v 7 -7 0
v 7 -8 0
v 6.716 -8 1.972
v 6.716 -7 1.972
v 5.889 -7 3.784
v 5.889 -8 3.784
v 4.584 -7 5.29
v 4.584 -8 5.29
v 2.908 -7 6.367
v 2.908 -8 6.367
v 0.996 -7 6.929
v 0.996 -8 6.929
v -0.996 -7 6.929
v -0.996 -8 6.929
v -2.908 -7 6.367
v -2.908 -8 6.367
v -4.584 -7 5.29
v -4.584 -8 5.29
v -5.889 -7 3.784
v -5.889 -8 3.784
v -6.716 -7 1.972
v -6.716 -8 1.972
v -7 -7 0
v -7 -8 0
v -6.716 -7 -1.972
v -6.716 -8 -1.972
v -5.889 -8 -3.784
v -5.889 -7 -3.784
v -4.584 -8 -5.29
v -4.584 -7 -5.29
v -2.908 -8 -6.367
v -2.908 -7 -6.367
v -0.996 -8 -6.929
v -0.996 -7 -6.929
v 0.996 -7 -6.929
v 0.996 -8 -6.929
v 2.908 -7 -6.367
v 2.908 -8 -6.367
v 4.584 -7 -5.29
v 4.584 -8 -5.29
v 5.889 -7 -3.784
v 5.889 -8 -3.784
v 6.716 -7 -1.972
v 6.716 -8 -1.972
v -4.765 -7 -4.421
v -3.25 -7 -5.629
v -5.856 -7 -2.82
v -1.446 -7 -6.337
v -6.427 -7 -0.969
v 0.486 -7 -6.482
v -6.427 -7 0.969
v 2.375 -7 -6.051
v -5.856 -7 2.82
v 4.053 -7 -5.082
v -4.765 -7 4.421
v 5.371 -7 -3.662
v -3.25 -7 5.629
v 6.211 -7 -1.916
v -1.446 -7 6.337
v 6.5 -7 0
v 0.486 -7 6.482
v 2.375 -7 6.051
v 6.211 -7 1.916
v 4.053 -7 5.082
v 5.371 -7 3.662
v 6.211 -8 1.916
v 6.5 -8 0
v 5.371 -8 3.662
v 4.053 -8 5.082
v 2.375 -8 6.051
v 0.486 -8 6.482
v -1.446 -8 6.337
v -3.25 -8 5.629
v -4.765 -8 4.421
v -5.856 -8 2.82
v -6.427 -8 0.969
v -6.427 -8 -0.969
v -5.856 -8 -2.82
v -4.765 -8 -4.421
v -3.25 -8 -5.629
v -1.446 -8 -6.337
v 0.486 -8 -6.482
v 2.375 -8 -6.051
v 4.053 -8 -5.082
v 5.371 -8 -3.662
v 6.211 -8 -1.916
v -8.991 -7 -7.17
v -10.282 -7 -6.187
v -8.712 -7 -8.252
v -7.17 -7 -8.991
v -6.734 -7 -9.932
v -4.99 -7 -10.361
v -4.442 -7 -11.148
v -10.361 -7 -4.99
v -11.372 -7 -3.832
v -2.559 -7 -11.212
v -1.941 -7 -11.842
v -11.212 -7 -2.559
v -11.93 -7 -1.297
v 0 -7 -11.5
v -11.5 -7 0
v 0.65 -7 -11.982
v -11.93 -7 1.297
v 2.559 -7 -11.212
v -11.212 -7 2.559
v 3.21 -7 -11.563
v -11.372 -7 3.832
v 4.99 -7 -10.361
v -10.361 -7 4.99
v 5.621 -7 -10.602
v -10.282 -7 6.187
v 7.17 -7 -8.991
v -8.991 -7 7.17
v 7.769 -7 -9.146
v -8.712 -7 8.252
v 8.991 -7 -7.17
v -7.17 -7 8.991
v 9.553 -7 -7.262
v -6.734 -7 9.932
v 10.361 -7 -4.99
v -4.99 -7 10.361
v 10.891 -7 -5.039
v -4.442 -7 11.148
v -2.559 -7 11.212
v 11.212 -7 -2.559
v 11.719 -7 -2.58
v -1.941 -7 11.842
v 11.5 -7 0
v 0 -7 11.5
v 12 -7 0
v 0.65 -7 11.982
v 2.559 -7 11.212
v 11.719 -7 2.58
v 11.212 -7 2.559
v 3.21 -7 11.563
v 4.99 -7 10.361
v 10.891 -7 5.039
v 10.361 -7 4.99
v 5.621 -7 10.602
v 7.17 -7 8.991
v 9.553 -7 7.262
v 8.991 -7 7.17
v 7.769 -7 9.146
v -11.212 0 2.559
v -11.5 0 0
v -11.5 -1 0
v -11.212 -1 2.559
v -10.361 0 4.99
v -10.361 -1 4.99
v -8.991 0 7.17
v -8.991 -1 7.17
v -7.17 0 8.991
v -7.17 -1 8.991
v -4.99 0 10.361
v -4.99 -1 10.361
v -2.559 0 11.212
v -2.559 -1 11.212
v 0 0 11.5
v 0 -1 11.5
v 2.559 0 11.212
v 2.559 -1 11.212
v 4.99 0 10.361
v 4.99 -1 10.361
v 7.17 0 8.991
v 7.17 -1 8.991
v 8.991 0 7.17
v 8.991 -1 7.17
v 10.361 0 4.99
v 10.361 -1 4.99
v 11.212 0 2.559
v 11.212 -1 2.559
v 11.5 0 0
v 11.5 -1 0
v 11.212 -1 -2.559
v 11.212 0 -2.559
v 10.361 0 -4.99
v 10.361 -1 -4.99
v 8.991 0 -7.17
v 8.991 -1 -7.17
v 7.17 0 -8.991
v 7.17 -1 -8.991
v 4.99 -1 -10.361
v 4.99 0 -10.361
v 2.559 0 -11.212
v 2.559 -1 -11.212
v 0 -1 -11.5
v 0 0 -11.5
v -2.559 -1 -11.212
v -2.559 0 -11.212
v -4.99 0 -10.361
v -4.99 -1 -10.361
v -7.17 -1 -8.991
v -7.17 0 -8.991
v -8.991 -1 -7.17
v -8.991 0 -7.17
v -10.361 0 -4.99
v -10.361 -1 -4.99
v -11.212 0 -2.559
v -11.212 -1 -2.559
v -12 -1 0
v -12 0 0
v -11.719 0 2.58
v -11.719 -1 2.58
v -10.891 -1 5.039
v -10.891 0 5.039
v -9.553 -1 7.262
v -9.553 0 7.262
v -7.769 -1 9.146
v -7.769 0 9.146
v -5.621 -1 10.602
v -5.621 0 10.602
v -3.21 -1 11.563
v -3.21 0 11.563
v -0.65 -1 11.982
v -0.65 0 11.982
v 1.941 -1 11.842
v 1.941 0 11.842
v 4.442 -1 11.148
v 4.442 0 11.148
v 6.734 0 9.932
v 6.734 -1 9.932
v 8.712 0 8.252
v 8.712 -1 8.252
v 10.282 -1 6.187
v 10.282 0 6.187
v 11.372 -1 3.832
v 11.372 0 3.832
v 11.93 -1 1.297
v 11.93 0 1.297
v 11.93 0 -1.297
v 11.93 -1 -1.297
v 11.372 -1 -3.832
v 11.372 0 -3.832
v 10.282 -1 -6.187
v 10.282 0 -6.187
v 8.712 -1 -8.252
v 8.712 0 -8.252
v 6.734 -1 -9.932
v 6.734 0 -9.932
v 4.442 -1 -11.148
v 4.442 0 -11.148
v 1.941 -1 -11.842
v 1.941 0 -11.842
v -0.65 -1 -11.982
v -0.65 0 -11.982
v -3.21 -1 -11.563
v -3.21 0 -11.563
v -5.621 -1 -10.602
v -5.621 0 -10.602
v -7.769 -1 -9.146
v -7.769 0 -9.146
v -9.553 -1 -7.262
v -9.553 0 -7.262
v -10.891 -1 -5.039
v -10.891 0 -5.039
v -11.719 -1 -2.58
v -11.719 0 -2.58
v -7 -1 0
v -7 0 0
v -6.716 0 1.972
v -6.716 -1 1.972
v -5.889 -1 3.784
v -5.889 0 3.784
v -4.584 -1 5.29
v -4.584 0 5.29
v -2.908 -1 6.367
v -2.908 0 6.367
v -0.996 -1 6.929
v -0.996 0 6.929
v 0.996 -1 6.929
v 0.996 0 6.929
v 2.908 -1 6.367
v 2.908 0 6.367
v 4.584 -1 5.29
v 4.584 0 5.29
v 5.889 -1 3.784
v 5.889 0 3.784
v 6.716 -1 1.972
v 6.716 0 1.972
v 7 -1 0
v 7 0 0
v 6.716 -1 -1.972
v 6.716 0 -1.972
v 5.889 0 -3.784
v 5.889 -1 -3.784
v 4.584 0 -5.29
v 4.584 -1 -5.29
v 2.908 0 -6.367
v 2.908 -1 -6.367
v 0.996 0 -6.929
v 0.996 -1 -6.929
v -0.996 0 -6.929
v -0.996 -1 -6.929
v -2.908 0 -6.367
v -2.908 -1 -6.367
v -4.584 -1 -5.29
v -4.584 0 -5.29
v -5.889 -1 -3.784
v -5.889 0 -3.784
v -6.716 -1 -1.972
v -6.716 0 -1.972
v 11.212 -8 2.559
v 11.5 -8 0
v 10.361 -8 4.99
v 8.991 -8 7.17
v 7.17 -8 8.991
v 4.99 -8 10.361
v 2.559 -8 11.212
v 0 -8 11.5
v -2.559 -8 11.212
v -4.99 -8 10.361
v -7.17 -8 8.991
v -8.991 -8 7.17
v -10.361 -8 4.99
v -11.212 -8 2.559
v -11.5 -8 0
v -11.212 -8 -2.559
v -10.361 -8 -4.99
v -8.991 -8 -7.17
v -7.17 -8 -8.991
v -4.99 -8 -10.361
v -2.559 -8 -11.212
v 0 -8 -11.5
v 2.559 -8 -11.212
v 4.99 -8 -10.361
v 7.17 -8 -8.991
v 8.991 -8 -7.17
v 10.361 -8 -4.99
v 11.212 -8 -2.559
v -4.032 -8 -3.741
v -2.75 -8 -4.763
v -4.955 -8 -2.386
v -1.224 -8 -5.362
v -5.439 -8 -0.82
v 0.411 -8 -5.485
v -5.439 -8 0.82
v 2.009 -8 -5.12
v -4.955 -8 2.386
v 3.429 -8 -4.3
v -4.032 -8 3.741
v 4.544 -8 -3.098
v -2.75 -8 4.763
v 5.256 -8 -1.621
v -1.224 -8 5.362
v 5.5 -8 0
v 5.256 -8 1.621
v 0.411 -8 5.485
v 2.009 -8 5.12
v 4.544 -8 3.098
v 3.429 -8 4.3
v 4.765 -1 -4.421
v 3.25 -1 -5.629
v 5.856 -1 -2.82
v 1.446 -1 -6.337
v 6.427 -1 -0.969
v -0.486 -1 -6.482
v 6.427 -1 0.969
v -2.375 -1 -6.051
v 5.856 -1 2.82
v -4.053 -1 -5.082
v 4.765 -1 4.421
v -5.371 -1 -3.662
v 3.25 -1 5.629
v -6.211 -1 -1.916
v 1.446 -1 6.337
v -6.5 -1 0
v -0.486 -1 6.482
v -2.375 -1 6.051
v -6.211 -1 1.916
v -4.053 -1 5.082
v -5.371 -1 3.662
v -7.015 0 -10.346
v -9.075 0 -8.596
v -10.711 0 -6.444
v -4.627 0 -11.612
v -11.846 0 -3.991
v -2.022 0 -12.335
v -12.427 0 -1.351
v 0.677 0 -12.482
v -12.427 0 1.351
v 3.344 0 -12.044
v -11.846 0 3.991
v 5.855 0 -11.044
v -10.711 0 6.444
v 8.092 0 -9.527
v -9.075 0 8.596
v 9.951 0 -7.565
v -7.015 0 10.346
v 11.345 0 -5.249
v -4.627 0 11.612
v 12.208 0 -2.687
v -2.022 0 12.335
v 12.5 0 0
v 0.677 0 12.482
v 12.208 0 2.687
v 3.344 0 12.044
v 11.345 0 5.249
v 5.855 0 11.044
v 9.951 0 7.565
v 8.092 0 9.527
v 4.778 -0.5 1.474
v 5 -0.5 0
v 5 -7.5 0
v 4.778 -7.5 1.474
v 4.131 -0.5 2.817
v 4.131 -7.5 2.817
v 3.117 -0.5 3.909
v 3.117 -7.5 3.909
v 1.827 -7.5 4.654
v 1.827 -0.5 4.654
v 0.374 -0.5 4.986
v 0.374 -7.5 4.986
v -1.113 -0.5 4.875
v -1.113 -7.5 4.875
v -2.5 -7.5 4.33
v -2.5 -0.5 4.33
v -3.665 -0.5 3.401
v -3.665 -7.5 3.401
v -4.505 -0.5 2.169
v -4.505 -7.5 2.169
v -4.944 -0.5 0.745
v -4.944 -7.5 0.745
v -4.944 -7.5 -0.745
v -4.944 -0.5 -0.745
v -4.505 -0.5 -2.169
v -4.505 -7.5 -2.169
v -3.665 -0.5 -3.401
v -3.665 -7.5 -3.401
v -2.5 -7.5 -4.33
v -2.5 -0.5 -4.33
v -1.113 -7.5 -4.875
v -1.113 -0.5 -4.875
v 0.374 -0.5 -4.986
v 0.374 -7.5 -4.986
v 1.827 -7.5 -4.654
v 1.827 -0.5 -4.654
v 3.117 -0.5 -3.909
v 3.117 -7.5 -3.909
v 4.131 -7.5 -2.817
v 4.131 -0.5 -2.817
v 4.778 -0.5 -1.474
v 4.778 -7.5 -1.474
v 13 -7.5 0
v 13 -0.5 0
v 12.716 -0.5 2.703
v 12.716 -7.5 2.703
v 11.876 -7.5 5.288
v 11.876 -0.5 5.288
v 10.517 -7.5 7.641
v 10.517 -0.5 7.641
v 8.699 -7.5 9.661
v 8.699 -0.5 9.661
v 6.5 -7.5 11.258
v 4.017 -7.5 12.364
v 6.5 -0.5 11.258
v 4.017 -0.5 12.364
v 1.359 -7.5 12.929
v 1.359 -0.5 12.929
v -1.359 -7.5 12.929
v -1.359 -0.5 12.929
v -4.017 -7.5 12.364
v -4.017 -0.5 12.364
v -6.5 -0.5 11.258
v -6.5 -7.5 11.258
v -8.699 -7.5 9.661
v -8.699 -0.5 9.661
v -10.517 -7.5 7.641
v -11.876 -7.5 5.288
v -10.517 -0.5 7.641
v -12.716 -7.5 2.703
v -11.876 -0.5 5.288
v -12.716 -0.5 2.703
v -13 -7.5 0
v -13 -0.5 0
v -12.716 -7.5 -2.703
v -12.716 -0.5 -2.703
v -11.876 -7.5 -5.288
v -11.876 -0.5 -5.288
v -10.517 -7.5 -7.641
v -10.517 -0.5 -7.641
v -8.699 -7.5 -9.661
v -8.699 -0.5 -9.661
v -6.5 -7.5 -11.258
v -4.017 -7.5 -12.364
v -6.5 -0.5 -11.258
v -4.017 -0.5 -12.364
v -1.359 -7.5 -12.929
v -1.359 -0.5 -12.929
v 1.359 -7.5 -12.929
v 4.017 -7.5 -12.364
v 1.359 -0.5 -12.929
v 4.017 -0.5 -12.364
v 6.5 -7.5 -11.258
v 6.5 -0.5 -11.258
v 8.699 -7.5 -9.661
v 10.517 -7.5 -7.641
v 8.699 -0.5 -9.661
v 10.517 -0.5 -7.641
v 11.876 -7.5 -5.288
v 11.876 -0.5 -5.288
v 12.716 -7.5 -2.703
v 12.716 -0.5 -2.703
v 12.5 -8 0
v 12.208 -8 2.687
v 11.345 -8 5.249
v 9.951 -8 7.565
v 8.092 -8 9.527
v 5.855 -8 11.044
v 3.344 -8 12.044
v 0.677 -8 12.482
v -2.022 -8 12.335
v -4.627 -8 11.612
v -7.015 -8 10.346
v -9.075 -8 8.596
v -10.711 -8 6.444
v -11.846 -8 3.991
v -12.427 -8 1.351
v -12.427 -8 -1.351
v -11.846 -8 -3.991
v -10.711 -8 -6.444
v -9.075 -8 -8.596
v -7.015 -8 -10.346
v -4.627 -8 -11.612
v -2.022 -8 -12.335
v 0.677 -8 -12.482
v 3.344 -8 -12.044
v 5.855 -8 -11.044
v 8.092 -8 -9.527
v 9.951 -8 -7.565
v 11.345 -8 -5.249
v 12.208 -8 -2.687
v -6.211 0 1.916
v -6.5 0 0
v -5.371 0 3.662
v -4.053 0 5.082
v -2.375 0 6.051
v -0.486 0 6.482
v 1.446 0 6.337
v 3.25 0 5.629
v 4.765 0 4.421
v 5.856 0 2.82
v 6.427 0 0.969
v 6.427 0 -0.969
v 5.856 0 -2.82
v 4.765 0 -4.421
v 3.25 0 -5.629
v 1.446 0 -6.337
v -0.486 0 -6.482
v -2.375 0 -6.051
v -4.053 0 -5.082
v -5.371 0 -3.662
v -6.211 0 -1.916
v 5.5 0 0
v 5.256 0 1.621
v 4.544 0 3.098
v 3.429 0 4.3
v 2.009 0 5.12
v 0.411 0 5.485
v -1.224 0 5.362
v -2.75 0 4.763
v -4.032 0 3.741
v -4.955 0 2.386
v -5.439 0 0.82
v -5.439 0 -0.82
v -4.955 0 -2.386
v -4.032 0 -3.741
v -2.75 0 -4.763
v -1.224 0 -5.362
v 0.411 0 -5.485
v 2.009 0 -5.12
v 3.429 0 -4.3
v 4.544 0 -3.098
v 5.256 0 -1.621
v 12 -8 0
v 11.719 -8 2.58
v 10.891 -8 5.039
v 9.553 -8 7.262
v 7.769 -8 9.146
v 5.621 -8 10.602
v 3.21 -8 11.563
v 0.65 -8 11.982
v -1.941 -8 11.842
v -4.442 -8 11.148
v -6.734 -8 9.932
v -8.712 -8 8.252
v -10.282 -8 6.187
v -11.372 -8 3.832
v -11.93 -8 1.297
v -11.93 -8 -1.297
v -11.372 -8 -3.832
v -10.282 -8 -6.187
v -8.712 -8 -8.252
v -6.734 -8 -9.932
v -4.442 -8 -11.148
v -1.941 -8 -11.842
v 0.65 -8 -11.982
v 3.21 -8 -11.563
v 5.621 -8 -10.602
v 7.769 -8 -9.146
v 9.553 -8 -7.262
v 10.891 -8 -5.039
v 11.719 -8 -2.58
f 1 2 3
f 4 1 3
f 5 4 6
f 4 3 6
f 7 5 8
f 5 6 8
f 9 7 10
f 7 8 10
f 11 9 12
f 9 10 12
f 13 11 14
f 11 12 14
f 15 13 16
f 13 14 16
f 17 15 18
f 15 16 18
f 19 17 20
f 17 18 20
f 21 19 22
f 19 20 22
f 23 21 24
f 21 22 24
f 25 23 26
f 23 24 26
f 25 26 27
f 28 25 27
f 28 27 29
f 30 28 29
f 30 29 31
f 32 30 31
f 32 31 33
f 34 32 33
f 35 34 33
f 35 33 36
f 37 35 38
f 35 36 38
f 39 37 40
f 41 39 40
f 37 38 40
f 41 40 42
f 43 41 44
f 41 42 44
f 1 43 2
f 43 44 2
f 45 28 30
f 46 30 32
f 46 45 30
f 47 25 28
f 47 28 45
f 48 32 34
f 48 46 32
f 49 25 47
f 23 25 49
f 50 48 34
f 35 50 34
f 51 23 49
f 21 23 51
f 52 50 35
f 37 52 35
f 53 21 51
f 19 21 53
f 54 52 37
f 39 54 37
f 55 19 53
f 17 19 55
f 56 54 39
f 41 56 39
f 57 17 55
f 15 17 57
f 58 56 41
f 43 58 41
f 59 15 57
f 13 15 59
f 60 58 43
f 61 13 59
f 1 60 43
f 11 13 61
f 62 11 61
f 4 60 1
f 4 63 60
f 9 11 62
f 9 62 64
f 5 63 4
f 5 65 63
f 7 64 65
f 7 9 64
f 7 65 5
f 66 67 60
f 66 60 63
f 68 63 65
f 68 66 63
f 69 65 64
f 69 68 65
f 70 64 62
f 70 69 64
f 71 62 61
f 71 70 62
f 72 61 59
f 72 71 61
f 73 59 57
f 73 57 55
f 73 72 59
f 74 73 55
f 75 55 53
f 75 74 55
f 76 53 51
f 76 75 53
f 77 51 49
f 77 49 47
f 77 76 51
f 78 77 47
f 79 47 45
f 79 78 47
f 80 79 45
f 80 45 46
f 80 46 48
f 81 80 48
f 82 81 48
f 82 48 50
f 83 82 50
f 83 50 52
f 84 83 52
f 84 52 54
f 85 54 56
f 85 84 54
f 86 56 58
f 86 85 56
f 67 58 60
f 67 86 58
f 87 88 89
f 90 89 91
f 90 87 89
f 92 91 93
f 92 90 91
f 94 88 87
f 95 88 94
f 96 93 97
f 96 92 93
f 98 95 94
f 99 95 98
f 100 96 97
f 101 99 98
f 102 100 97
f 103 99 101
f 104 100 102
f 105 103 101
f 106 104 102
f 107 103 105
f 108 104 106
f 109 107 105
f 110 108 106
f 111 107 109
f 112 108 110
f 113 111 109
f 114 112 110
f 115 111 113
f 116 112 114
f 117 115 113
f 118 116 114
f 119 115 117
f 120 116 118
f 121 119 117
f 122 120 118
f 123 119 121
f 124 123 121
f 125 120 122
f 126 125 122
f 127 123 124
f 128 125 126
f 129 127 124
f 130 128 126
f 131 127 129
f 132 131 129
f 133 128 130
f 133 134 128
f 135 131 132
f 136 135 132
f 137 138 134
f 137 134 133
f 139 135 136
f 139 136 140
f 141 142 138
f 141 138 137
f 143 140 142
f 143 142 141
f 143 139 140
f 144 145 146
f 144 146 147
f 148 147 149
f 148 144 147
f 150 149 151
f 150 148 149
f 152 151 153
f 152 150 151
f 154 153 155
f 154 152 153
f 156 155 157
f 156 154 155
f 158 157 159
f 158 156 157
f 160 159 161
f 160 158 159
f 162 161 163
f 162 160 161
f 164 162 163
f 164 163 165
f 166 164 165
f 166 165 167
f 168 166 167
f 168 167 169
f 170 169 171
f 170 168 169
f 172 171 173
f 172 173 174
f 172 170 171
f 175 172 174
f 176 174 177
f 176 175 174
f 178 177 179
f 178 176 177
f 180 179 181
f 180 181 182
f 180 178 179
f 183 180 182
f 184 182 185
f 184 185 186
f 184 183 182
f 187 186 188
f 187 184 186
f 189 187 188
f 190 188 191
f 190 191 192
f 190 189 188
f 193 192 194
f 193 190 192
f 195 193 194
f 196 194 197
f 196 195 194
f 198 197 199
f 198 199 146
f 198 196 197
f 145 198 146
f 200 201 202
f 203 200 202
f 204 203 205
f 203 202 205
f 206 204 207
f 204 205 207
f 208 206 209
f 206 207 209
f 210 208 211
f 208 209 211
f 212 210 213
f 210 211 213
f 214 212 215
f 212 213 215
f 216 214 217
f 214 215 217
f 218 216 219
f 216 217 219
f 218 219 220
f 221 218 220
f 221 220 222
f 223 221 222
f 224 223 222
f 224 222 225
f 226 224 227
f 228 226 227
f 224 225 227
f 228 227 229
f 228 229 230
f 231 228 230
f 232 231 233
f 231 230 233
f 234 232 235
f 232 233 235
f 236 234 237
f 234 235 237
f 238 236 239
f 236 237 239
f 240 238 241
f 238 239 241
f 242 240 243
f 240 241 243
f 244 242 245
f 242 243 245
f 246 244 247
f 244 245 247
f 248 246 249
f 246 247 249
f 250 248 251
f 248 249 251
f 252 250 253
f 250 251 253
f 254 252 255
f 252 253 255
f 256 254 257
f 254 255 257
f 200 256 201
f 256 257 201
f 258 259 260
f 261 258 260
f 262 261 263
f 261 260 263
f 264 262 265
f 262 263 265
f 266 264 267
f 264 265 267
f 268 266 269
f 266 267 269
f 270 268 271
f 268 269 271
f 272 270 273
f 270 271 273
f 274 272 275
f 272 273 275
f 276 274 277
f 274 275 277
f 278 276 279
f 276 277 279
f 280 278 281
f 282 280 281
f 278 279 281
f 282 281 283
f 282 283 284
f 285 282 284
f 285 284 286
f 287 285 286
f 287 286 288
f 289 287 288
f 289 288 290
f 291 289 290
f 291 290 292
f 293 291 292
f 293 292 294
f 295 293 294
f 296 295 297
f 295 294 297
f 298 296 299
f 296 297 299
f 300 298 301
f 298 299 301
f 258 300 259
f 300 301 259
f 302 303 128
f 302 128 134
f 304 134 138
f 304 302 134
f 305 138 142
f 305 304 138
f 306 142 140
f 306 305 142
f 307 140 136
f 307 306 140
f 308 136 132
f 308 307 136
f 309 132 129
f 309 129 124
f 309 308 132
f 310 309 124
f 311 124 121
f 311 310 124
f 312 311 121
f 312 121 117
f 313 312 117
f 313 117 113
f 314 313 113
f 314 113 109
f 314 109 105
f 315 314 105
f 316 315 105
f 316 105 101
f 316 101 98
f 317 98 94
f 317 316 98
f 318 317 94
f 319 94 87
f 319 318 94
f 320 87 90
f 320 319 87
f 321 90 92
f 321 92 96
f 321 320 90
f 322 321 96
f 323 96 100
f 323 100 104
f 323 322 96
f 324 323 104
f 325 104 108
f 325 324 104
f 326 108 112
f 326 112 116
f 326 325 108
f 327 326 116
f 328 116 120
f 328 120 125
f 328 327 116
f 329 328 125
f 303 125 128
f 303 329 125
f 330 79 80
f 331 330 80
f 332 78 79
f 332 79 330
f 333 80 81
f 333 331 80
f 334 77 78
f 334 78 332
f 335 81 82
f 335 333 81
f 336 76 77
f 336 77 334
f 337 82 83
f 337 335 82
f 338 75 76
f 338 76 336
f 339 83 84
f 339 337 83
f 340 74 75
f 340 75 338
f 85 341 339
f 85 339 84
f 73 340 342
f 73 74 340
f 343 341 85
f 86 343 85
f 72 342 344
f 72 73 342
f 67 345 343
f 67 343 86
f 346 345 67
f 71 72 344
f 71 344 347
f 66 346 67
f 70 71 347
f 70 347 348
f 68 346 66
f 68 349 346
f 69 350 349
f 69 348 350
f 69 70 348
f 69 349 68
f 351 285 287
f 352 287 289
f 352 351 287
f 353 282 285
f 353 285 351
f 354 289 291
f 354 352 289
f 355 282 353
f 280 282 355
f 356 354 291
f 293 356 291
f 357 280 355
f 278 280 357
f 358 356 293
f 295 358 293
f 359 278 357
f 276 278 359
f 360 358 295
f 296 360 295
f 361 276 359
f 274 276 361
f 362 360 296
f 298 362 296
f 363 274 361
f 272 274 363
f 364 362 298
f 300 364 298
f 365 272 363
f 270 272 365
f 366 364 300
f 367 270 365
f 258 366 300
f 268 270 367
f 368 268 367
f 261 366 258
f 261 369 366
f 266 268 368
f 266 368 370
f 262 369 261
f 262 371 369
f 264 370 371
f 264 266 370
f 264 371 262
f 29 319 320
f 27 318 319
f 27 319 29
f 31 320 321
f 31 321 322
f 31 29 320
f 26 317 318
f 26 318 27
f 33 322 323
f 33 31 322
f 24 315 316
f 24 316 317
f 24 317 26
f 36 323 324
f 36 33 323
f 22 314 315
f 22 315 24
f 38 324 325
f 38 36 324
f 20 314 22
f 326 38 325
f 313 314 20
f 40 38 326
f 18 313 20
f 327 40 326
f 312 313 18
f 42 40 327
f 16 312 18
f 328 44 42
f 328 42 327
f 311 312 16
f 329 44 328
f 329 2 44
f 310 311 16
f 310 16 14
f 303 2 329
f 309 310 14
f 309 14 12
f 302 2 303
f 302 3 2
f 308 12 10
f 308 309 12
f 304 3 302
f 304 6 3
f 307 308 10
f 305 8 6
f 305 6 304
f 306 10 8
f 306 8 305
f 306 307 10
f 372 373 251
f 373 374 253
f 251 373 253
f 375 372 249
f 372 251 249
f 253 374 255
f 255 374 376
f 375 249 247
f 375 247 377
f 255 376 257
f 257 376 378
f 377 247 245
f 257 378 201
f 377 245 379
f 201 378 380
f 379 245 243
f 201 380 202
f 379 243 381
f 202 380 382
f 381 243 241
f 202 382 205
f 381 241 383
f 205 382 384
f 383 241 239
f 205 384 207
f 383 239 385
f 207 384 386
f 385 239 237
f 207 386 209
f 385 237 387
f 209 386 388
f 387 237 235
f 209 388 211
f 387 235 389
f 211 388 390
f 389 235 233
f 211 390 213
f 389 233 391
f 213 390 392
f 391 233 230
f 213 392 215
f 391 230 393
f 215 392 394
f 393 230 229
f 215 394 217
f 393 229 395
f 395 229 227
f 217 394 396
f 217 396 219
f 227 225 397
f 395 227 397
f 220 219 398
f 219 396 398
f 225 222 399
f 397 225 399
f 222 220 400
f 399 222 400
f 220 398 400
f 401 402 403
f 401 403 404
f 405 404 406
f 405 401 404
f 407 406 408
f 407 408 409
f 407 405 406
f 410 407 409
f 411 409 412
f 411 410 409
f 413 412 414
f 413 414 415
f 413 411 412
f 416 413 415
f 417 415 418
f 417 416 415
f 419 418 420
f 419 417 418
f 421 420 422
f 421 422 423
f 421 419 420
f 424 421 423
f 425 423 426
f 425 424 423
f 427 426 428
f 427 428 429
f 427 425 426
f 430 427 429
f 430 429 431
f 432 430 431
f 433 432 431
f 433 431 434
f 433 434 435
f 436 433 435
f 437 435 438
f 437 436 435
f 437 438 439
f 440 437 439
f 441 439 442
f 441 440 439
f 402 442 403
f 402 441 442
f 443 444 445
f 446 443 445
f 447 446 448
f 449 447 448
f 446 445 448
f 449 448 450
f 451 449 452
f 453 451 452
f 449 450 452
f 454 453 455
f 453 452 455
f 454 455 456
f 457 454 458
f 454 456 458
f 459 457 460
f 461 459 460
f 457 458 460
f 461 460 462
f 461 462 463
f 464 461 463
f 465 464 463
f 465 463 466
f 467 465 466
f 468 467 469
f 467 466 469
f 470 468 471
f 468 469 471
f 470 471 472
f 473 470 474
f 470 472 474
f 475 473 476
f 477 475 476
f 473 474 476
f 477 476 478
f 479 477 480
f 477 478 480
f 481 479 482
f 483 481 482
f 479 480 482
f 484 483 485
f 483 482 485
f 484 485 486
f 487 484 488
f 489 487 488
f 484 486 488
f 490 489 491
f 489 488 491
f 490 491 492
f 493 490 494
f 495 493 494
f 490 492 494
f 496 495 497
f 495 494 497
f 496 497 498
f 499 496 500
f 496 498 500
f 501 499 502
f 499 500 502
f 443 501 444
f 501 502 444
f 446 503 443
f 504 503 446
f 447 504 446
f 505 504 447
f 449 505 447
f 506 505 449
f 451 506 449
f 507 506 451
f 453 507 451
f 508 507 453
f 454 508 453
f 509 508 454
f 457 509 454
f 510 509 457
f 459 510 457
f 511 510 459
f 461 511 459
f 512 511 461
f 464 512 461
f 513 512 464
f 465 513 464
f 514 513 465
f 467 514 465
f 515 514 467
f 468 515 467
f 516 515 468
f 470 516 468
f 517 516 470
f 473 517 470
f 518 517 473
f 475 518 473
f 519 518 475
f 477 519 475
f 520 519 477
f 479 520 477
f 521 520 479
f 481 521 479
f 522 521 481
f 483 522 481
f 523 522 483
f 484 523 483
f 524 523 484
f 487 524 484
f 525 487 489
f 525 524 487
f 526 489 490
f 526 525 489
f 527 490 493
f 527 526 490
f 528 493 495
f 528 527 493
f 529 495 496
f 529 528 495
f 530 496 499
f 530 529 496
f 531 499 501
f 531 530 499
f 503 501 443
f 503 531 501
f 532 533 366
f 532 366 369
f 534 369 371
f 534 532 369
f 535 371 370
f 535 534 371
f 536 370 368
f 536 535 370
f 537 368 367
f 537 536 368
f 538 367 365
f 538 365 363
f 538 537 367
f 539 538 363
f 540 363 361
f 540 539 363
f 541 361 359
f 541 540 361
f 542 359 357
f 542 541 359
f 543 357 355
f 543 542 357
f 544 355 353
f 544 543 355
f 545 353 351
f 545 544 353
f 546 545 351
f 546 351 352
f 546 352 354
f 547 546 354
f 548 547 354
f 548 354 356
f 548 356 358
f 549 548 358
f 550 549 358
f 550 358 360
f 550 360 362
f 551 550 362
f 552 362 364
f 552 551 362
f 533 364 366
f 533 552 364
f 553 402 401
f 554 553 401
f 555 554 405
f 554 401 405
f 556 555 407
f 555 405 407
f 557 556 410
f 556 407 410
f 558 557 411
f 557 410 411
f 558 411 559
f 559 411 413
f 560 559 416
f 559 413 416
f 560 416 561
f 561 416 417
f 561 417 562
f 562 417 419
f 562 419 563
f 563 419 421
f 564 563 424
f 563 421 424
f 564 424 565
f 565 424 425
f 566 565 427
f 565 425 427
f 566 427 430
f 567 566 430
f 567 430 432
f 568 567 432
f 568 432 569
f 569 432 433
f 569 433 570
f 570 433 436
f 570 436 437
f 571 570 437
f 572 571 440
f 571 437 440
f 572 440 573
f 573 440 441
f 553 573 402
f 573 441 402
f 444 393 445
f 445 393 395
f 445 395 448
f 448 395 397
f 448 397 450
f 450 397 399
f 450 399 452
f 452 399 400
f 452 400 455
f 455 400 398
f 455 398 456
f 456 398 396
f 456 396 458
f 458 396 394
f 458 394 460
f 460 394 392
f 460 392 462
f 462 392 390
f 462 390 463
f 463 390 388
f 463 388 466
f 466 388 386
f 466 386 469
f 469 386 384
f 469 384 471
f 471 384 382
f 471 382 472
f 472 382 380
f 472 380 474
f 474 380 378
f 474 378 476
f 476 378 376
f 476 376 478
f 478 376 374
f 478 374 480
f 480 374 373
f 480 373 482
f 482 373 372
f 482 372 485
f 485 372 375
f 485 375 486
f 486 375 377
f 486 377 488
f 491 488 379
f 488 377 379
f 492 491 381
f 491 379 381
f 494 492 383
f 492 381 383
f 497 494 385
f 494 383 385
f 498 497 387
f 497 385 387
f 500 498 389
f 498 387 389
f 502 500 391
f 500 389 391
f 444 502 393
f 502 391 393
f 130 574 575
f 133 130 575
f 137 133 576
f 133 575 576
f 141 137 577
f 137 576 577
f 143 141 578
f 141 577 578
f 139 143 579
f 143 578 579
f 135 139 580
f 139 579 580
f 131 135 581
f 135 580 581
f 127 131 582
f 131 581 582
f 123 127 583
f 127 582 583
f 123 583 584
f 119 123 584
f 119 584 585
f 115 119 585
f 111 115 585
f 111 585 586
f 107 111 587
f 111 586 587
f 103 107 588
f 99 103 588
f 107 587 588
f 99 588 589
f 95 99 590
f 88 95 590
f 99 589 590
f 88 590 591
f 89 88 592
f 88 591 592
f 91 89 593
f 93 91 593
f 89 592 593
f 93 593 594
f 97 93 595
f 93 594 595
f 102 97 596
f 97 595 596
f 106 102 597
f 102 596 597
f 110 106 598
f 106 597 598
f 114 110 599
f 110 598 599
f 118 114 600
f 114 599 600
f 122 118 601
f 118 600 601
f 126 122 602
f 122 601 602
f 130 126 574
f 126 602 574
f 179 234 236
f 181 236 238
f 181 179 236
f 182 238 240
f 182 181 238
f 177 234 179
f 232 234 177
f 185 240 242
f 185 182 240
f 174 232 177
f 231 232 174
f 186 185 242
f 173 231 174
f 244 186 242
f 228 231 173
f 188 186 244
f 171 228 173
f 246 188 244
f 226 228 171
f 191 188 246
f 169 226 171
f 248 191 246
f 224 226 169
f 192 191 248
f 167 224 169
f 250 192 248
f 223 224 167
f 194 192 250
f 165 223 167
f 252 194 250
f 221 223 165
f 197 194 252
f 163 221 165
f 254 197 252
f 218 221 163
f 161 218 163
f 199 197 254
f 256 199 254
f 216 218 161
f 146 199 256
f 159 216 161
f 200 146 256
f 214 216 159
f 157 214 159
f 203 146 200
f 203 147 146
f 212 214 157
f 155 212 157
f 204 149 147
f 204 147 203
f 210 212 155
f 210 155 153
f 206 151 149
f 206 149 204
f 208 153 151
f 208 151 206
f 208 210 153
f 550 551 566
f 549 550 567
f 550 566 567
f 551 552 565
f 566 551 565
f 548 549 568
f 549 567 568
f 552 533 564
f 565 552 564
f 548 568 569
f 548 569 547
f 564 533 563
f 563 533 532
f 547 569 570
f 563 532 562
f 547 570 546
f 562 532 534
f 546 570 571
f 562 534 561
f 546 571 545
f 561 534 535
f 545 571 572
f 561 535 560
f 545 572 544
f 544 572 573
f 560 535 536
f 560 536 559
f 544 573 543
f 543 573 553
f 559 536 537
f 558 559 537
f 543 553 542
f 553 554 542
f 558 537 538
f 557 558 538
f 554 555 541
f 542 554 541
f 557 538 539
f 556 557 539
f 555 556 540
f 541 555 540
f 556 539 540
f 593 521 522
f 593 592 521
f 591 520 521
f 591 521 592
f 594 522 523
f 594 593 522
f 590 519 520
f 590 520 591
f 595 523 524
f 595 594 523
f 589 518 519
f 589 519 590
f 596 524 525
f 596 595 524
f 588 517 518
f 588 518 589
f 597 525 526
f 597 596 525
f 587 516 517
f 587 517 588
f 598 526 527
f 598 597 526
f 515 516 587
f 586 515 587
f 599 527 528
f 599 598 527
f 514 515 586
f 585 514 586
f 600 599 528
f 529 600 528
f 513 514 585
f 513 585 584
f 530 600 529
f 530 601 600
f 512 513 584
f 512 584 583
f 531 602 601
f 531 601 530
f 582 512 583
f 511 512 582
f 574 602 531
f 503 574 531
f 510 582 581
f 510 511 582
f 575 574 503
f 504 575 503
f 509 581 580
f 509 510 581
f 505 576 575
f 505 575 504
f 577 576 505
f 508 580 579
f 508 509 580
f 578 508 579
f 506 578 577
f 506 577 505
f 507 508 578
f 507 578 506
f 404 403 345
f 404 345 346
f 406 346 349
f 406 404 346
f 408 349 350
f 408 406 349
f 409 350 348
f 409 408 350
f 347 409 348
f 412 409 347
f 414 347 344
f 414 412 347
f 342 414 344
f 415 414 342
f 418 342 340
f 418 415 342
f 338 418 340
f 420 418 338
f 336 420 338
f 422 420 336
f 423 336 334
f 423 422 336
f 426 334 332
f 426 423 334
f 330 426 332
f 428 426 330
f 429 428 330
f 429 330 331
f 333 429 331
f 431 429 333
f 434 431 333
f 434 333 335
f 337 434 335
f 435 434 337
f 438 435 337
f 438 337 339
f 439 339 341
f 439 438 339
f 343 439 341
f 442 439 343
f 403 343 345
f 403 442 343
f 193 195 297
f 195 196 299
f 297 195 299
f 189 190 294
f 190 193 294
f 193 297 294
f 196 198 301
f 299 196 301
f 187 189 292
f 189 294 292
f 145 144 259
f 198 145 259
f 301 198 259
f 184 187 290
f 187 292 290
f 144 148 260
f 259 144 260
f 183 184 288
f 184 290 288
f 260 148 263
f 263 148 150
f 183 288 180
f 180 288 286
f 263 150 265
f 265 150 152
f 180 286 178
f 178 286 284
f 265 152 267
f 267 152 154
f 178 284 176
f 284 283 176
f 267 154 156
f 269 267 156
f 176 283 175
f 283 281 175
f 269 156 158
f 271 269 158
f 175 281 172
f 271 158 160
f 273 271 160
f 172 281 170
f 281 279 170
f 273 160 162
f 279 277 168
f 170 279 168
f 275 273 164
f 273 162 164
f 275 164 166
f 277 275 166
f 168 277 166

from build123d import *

# Parameters (mm, degrees)
F0_R     = 13
F0_R_2   = 5
F1_DEPTH = 8
F2_R     = 12
F2_R_2   = 11.5
F2_R_3   = 7
F2_R_4   = 6.5
F3_DEPTH = 1
F4_R     = 12
F4_R_2   = 11.5
F4_R_3   = 7
F4_R_4   = 6.5
F5_DEPTH = 1
F6_SIZE  = 0.5


with BuildPart() as f1:
    # F0 (on Front) → F1 (new body)
    with BuildSketch(Plane.XZ):
        Circle(F0_R)
        Circle(F0_R_2, mode=Mode.SUBTRACT)
    extrude(amount=F1_DEPTH)

    # F2 (on face) → F3 (cut)
    with BuildSketch(Plane.XZ.offset(8)):
        Circle(F2_R)
        Circle(F2_R_2, mode=Mode.SUBTRACT)
        Circle(F2_R_3)
        Circle(F2_R_4, mode=Mode.SUBTRACT)
    extrude(amount=-F3_DEPTH, mode=Mode.SUBTRACT)

    # F4 (on face) → F5 (cut)
    with BuildSketch(Plane(origin=(0, 0, 0), x_dir=(-1, 0, 0), z_dir=(0, 1, 0))):
        Circle(F4_R)
        Circle(F4_R_2, mode=Mode.SUBTRACT)
        Circle(F4_R_3)
        Circle(F4_R_4, mode=Mode.SUBTRACT)
    extrude(amount=-F5_DEPTH, mode=Mode.SUBTRACT)

    # F6
    f6_edges = [f1.edges().sort_by_distance(p)[0] for p in [
        (-13, 0, 0),
        (-5, 0, 0),
        (-5, -8, 0),
        (-13, -8, 0),
    ]]
    chamfer(f6_edges, length=F6_SIZE)


solid = f1.part
